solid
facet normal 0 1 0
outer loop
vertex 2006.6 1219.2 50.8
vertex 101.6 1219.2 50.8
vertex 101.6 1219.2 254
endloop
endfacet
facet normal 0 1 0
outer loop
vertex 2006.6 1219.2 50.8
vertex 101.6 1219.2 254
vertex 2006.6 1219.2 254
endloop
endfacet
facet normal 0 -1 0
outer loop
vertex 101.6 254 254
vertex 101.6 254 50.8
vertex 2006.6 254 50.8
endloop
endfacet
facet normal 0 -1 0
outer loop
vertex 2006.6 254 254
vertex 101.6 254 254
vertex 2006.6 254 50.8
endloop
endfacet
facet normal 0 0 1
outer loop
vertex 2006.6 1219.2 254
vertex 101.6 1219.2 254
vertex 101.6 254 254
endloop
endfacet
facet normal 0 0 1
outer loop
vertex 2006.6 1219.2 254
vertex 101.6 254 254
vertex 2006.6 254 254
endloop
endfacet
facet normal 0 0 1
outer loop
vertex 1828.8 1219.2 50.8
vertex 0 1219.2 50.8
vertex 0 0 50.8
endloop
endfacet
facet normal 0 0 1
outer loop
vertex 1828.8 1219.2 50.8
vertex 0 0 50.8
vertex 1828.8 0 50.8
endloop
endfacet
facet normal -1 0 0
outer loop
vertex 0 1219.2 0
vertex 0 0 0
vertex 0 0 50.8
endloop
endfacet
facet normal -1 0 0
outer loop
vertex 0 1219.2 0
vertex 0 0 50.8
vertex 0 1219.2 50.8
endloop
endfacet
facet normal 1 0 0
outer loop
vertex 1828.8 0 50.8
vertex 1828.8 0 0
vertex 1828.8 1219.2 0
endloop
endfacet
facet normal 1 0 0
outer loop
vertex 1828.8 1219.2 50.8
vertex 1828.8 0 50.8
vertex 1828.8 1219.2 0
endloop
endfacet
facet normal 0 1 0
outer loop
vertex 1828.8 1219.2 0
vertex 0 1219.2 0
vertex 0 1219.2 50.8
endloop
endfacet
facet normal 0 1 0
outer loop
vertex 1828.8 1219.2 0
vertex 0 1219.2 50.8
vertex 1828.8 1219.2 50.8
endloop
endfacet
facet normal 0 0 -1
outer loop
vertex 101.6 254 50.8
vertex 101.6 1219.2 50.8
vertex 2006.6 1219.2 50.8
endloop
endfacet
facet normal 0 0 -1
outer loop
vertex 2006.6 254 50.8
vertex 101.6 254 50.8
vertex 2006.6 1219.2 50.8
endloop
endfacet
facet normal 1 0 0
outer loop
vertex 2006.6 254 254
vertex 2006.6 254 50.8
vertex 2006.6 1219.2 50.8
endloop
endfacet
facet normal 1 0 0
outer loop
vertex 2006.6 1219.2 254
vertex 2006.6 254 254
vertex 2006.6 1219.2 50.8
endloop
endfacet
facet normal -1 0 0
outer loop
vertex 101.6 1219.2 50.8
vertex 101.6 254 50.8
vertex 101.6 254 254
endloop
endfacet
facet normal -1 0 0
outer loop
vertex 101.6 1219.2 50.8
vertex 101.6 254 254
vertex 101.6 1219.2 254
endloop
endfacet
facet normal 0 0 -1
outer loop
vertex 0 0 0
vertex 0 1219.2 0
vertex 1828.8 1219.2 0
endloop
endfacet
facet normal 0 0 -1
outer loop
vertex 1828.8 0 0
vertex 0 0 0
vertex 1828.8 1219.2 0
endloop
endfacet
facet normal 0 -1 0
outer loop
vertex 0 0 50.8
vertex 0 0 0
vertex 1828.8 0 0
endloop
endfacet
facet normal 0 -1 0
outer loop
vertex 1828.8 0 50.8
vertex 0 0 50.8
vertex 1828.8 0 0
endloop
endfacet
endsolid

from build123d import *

# Parameters (mm, degrees)
F0_W      = 1828.8
F0_H      = 1219.2
F1_DEPTH  = 50.8
F6_DEPTH  = 25.4
F8_DEPTH  = 25.4
F9_W      = 1905
F9_H      = 965.2
F10_DEPTH = 203.2


# Not quite as in the source:
# - a feature of the source that left no trace in its solid (it failed there, or was rolled back) is left out


with BuildPart() as f1:
    # F0 (on Top) → F1 (new body)
    with BuildSketch(Plane.XY):
        with Locations((914.4, 609.6)):
            Rectangle(F0_W, F0_H)
    extrude(amount=F1_DEPTH)

    # F5 (on face) → F6 (cut)
    with BuildSketch(Plane.XZ):
        with BuildLine():
            Line((1254.4775691986, 50.8), (1711.6775691986, 50.8))
            ThreePointArc((1711.6775691986, 50.8), (1783.5196181672, 80.5579510314), (1813.2775691986, 152.4))
            Line((1813.2775691986, 152.4), (1813.2775691986, 863.6))
            ThreePointArc((1813.2775691986, 863.6), (1783.5196181672, 935.4420489686), (1711.6775691986, 965.2))
            Line((1711.6775691986, 965.2), (1254.4775691986, 965.2))
            ThreePointArc((1254.4775691986, 965.2), (1182.6355202301, 935.4420489686), (1152.8775691986, 863.6))
            Line((1152.8775691986, 863.6), (1152.8775691986, 152.4))
            ThreePointArc((1152.8775691986, 152.4), (1182.6355202301, 80.5579510314), (1254.4775691986, 50.8))
        make_face()
    extrude(amount=-F6_DEPTH, mode=Mode.SUBTRACT)

    # F7 (on face) → F8 (cut)
    with BuildSketch(Plane(origin=(0, 1219.2, 0), x_dir=(-1, 0, 0), z_dir=(0, 1, 0))):
        with BuildLine():
            Line((-1854.2, 736.6), (-2133.6, 736.6))
            ThreePointArc((-2133.6, 736.6), (-2169.5210244843, 721.7210244843), (-2184.4, 685.8))
            Line((-2184.4, 685.8), (-2184.4, 558.8))
            ThreePointArc((-2184.4, 558.8), (-2169.5210244843, 522.8789755157), (-2133.6, 508))
            Line((-2133.6, 508), (-1854.2, 508))
            ThreePointArc((-1854.2, 508), (-1818.2789755157, 522.8789755157), (-1803.4, 558.8))
            Line((-1803.4, 558.8), (-1803.4, 685.8))
            ThreePointArc((-1803.4, 685.8), (-1818.2789755157, 721.7210244843), (-1854.2, 736.6))
        make_face()
    extrude(amount=-F8_DEPTH, mode=Mode.SUBTRACT)


with BuildPart() as f10:
    # F9 (on face) → F10 (new body)
    with BuildSketch(Plane.XY.offset(50.8)):
        with Locations((1054.1, 736.6)):
            Rectangle(F9_W, F9_H)
    extrude(amount=F10_DEPTH)


solid = Compound([f1.part, f10.part])
